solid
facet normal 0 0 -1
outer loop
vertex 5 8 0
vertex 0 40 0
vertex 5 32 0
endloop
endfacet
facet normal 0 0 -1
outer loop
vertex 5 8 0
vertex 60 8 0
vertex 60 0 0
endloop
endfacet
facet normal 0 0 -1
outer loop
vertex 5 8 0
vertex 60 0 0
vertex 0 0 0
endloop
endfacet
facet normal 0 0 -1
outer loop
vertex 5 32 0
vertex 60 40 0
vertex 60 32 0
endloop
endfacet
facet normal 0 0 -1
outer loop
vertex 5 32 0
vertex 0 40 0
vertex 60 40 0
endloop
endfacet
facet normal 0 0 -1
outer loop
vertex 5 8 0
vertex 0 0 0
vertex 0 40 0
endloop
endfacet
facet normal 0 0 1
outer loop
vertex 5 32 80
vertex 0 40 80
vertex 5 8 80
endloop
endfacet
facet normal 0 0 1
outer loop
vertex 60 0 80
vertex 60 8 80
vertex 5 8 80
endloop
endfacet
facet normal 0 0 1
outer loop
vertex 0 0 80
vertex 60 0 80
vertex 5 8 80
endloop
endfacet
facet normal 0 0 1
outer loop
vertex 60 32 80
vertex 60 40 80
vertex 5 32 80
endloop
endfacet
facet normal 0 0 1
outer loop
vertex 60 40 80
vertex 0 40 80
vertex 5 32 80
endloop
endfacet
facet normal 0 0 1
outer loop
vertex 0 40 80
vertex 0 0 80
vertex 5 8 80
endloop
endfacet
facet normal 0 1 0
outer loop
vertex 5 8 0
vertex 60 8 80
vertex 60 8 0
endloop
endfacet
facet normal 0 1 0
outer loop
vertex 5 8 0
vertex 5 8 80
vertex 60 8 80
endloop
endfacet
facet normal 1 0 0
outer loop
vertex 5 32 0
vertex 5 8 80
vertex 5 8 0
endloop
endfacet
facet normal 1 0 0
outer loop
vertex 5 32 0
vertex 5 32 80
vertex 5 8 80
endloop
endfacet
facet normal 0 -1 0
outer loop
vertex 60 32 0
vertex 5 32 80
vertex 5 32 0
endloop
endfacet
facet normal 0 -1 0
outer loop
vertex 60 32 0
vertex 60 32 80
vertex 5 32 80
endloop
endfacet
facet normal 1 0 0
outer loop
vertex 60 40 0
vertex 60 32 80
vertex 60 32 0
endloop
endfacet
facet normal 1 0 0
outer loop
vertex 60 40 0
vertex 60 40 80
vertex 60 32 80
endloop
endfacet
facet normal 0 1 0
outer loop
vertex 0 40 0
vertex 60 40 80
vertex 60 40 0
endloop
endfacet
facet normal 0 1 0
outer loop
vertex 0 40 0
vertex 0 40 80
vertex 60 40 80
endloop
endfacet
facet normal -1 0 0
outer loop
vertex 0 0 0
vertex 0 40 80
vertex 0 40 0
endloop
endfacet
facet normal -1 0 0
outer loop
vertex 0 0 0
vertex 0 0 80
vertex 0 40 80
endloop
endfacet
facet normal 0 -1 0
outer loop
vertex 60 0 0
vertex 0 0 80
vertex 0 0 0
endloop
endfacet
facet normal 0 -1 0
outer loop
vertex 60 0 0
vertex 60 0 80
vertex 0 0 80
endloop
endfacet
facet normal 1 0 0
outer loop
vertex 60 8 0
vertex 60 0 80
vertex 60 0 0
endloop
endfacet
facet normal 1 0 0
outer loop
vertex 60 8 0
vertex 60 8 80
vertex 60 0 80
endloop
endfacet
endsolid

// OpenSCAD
$fn = 32;

// ----------------------------------------------------------------------
// Structural section: channel 60 x 40 mm
// ----------------------------------------------------------------------

// --- parameters (mm) ---
sec_w = 60;               // channel width, X
sec_h = 40;               // channel height, Y
flange_t = 8;             // flange thickness
web_t = 5;                // web thickness
plate_t = 80;             // cut length, Z (extrusion height)
fit_tol = 0.05;           // declared fit tolerance (prompt contract)
free_tol = 0.2;           // declared free tolerance (prompt contract)

profile = [[0, 0], [60, 0], [60, 8], [5, 8], [5, 32], [60, 32], [60, 40], [0, 40]];  // primary outline, 8 points, counter clockwise

// --- the one profile operation ---
linear_extrude(height = plate_t) polygon(points = profile);
